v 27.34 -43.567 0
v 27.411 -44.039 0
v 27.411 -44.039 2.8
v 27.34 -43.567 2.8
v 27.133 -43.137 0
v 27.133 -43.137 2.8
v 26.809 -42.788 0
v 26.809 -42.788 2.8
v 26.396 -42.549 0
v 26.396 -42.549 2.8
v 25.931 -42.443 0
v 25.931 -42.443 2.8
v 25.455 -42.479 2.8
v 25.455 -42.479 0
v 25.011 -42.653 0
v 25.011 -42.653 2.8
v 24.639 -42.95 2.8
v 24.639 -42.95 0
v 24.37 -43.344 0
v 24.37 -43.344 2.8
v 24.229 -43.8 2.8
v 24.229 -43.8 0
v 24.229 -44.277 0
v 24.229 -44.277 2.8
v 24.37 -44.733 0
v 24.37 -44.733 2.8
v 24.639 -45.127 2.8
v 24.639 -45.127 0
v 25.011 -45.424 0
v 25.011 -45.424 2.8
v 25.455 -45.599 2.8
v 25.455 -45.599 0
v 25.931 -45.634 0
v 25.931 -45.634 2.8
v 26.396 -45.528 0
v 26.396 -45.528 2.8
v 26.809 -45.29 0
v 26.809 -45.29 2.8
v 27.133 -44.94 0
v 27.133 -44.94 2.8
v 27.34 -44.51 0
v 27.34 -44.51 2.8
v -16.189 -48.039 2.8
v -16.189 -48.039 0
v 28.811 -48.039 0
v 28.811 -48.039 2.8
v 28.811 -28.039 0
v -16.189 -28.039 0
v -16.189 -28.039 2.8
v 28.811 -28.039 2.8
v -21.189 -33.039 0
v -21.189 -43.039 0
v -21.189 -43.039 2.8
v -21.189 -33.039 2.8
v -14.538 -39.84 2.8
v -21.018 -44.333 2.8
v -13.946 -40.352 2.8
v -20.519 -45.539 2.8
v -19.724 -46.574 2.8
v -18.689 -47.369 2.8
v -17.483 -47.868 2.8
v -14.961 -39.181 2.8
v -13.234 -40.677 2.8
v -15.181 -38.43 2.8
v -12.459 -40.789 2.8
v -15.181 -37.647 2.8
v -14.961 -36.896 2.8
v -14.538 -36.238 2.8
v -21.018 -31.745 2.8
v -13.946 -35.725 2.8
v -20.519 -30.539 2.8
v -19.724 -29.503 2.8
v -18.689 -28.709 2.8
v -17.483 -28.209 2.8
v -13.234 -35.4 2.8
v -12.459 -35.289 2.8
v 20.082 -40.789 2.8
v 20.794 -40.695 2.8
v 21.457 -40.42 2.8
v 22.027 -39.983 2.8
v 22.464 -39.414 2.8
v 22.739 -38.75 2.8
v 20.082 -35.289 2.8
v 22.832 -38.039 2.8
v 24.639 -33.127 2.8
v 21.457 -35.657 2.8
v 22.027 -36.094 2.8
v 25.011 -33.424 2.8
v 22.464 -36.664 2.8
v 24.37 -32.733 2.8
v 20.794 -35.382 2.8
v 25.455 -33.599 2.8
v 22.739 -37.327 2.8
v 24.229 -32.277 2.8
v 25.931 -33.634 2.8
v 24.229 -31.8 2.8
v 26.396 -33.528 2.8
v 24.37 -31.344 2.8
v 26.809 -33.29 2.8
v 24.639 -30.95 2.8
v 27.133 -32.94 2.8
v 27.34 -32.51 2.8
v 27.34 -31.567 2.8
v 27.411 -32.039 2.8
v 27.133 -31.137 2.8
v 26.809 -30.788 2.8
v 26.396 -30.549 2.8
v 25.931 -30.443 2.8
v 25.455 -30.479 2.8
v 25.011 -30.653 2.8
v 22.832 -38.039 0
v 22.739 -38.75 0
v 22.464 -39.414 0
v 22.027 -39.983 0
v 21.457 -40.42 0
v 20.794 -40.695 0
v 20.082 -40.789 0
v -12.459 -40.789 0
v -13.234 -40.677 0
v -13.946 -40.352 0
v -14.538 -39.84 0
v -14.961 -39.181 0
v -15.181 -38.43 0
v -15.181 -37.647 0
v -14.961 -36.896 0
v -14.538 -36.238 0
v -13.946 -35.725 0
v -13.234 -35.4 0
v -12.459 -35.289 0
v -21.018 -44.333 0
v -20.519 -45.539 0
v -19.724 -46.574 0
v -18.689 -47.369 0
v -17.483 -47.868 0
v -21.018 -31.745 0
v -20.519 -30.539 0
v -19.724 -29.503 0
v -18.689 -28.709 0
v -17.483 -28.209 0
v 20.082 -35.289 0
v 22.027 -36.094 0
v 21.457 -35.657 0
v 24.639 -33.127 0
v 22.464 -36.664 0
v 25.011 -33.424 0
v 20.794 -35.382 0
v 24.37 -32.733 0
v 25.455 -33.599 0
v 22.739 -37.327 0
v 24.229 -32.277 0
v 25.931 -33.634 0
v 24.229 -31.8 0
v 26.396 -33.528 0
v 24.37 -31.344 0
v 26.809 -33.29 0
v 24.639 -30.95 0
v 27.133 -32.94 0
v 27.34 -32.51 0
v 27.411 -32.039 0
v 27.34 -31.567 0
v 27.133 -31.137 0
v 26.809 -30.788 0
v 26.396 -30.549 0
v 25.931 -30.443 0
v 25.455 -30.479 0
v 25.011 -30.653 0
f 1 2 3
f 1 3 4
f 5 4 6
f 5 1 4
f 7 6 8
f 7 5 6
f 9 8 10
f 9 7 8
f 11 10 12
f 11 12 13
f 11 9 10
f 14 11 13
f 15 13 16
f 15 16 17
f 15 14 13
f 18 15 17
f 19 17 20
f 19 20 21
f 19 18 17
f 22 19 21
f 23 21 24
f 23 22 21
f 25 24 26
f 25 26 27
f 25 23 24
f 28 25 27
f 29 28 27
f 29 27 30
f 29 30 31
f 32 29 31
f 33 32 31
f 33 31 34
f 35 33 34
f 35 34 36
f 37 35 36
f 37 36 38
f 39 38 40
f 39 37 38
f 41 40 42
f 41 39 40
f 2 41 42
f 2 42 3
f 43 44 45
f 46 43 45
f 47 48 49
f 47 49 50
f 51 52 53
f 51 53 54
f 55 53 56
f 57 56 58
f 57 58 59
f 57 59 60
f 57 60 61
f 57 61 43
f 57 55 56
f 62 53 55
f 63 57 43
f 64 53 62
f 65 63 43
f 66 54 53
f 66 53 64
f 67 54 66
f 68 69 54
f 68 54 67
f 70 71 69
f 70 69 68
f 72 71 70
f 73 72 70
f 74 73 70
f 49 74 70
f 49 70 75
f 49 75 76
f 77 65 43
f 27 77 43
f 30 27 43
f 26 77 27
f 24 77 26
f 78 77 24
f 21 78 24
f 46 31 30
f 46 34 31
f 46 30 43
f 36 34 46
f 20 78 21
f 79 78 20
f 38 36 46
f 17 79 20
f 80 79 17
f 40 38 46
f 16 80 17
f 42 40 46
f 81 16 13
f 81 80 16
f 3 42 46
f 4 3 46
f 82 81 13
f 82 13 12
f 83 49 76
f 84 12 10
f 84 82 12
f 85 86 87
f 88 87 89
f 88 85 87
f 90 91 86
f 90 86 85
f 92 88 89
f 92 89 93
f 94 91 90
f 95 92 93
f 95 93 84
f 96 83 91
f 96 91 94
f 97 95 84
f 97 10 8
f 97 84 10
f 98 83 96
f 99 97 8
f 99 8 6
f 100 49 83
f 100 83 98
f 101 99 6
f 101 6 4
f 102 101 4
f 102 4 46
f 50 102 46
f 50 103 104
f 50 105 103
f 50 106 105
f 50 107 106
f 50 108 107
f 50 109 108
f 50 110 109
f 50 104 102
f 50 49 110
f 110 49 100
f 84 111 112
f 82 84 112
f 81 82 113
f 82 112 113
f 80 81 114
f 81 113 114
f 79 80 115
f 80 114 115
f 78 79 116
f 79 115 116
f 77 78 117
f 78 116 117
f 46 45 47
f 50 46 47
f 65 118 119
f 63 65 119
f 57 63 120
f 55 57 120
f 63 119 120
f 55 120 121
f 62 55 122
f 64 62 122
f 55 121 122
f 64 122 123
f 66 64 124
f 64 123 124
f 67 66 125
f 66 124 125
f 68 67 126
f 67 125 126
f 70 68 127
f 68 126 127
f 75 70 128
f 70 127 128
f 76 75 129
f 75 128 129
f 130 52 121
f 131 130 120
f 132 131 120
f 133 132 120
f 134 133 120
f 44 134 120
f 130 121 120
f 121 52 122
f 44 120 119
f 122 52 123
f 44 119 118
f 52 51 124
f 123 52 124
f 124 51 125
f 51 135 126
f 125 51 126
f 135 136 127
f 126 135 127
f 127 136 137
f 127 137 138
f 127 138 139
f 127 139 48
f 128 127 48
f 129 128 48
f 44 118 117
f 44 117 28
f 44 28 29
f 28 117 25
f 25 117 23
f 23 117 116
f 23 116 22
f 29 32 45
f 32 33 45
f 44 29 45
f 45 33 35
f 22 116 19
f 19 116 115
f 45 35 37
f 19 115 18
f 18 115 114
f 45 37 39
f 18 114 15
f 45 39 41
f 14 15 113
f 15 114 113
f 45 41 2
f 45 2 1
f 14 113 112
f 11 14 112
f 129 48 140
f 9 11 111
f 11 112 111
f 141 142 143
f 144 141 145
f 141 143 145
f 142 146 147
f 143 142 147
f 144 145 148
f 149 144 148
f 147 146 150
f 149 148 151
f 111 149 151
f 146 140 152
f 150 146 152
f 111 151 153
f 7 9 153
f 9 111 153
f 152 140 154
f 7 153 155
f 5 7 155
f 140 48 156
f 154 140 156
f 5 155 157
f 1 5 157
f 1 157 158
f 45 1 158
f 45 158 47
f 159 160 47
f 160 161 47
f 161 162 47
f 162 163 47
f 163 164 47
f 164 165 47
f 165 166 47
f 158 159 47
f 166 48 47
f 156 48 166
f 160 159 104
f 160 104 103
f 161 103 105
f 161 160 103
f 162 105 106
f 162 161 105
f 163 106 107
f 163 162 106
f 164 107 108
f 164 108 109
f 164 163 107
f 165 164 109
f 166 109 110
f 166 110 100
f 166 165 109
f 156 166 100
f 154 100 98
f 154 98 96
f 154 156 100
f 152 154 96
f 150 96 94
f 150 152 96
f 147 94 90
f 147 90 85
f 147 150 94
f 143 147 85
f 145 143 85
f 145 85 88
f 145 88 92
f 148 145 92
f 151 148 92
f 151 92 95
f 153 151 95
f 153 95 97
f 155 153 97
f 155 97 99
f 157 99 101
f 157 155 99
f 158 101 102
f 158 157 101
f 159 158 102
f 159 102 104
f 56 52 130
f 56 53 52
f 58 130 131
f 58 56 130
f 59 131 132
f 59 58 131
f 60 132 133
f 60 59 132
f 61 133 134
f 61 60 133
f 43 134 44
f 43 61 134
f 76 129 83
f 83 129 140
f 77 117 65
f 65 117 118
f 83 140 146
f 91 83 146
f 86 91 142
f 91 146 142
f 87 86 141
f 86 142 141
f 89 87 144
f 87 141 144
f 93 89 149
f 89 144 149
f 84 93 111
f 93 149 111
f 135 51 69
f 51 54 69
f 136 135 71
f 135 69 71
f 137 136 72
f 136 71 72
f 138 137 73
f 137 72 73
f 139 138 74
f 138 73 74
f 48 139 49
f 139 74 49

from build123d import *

# Parameters (mm, degrees)
F0_W     = 50
F0_H     = 20
F0_R     = 1.6
F1_DEPTH = 2.8
F2_R     = 5


with BuildPart() as f1:
    # F0 (on Top) → F1 (new body)
    with BuildSketch(Plane.XY):
        with Locations((3.811439, -38.038712)):
            Rectangle(F0_W, F0_H)
        with Locations((25.811439, -44.038712)):
            Circle(F0_R, mode=Mode.SUBTRACT)
        with BuildLine():
            ThreePointArc((-12.459394, -40.788712), (-15.209394, -38.038712), (-12.459394, -35.288712))
            Line((-12.459394, -35.288712), (20.082271, -35.288712))
            ThreePointArc((20.082271, -35.288712), (22.026815, -36.094168), (22.832271, -38.038712))
            ThreePointArc((22.832271, -38.038712), (22.026815, -39.983256), (20.082271, -40.788712))
            Line((20.082271, -40.788712), (-12.459394, -40.788712))
        make_face(mode=Mode.SUBTRACT)
        with Locations((25.811439, -32.038712)):
            Circle(F0_R, mode=Mode.SUBTRACT)
    extrude(amount=F1_DEPTH)

    # F2
    f2_edges = [f1.edges().sort_by_distance(p)[0] for p in [
        (-21.188561, -48.038712, 1.4),
        (-21.188561, -28.038712, 1.4),
    ]]
    fillet(f2_edges, radius=F2_R)


solid = f1.part
